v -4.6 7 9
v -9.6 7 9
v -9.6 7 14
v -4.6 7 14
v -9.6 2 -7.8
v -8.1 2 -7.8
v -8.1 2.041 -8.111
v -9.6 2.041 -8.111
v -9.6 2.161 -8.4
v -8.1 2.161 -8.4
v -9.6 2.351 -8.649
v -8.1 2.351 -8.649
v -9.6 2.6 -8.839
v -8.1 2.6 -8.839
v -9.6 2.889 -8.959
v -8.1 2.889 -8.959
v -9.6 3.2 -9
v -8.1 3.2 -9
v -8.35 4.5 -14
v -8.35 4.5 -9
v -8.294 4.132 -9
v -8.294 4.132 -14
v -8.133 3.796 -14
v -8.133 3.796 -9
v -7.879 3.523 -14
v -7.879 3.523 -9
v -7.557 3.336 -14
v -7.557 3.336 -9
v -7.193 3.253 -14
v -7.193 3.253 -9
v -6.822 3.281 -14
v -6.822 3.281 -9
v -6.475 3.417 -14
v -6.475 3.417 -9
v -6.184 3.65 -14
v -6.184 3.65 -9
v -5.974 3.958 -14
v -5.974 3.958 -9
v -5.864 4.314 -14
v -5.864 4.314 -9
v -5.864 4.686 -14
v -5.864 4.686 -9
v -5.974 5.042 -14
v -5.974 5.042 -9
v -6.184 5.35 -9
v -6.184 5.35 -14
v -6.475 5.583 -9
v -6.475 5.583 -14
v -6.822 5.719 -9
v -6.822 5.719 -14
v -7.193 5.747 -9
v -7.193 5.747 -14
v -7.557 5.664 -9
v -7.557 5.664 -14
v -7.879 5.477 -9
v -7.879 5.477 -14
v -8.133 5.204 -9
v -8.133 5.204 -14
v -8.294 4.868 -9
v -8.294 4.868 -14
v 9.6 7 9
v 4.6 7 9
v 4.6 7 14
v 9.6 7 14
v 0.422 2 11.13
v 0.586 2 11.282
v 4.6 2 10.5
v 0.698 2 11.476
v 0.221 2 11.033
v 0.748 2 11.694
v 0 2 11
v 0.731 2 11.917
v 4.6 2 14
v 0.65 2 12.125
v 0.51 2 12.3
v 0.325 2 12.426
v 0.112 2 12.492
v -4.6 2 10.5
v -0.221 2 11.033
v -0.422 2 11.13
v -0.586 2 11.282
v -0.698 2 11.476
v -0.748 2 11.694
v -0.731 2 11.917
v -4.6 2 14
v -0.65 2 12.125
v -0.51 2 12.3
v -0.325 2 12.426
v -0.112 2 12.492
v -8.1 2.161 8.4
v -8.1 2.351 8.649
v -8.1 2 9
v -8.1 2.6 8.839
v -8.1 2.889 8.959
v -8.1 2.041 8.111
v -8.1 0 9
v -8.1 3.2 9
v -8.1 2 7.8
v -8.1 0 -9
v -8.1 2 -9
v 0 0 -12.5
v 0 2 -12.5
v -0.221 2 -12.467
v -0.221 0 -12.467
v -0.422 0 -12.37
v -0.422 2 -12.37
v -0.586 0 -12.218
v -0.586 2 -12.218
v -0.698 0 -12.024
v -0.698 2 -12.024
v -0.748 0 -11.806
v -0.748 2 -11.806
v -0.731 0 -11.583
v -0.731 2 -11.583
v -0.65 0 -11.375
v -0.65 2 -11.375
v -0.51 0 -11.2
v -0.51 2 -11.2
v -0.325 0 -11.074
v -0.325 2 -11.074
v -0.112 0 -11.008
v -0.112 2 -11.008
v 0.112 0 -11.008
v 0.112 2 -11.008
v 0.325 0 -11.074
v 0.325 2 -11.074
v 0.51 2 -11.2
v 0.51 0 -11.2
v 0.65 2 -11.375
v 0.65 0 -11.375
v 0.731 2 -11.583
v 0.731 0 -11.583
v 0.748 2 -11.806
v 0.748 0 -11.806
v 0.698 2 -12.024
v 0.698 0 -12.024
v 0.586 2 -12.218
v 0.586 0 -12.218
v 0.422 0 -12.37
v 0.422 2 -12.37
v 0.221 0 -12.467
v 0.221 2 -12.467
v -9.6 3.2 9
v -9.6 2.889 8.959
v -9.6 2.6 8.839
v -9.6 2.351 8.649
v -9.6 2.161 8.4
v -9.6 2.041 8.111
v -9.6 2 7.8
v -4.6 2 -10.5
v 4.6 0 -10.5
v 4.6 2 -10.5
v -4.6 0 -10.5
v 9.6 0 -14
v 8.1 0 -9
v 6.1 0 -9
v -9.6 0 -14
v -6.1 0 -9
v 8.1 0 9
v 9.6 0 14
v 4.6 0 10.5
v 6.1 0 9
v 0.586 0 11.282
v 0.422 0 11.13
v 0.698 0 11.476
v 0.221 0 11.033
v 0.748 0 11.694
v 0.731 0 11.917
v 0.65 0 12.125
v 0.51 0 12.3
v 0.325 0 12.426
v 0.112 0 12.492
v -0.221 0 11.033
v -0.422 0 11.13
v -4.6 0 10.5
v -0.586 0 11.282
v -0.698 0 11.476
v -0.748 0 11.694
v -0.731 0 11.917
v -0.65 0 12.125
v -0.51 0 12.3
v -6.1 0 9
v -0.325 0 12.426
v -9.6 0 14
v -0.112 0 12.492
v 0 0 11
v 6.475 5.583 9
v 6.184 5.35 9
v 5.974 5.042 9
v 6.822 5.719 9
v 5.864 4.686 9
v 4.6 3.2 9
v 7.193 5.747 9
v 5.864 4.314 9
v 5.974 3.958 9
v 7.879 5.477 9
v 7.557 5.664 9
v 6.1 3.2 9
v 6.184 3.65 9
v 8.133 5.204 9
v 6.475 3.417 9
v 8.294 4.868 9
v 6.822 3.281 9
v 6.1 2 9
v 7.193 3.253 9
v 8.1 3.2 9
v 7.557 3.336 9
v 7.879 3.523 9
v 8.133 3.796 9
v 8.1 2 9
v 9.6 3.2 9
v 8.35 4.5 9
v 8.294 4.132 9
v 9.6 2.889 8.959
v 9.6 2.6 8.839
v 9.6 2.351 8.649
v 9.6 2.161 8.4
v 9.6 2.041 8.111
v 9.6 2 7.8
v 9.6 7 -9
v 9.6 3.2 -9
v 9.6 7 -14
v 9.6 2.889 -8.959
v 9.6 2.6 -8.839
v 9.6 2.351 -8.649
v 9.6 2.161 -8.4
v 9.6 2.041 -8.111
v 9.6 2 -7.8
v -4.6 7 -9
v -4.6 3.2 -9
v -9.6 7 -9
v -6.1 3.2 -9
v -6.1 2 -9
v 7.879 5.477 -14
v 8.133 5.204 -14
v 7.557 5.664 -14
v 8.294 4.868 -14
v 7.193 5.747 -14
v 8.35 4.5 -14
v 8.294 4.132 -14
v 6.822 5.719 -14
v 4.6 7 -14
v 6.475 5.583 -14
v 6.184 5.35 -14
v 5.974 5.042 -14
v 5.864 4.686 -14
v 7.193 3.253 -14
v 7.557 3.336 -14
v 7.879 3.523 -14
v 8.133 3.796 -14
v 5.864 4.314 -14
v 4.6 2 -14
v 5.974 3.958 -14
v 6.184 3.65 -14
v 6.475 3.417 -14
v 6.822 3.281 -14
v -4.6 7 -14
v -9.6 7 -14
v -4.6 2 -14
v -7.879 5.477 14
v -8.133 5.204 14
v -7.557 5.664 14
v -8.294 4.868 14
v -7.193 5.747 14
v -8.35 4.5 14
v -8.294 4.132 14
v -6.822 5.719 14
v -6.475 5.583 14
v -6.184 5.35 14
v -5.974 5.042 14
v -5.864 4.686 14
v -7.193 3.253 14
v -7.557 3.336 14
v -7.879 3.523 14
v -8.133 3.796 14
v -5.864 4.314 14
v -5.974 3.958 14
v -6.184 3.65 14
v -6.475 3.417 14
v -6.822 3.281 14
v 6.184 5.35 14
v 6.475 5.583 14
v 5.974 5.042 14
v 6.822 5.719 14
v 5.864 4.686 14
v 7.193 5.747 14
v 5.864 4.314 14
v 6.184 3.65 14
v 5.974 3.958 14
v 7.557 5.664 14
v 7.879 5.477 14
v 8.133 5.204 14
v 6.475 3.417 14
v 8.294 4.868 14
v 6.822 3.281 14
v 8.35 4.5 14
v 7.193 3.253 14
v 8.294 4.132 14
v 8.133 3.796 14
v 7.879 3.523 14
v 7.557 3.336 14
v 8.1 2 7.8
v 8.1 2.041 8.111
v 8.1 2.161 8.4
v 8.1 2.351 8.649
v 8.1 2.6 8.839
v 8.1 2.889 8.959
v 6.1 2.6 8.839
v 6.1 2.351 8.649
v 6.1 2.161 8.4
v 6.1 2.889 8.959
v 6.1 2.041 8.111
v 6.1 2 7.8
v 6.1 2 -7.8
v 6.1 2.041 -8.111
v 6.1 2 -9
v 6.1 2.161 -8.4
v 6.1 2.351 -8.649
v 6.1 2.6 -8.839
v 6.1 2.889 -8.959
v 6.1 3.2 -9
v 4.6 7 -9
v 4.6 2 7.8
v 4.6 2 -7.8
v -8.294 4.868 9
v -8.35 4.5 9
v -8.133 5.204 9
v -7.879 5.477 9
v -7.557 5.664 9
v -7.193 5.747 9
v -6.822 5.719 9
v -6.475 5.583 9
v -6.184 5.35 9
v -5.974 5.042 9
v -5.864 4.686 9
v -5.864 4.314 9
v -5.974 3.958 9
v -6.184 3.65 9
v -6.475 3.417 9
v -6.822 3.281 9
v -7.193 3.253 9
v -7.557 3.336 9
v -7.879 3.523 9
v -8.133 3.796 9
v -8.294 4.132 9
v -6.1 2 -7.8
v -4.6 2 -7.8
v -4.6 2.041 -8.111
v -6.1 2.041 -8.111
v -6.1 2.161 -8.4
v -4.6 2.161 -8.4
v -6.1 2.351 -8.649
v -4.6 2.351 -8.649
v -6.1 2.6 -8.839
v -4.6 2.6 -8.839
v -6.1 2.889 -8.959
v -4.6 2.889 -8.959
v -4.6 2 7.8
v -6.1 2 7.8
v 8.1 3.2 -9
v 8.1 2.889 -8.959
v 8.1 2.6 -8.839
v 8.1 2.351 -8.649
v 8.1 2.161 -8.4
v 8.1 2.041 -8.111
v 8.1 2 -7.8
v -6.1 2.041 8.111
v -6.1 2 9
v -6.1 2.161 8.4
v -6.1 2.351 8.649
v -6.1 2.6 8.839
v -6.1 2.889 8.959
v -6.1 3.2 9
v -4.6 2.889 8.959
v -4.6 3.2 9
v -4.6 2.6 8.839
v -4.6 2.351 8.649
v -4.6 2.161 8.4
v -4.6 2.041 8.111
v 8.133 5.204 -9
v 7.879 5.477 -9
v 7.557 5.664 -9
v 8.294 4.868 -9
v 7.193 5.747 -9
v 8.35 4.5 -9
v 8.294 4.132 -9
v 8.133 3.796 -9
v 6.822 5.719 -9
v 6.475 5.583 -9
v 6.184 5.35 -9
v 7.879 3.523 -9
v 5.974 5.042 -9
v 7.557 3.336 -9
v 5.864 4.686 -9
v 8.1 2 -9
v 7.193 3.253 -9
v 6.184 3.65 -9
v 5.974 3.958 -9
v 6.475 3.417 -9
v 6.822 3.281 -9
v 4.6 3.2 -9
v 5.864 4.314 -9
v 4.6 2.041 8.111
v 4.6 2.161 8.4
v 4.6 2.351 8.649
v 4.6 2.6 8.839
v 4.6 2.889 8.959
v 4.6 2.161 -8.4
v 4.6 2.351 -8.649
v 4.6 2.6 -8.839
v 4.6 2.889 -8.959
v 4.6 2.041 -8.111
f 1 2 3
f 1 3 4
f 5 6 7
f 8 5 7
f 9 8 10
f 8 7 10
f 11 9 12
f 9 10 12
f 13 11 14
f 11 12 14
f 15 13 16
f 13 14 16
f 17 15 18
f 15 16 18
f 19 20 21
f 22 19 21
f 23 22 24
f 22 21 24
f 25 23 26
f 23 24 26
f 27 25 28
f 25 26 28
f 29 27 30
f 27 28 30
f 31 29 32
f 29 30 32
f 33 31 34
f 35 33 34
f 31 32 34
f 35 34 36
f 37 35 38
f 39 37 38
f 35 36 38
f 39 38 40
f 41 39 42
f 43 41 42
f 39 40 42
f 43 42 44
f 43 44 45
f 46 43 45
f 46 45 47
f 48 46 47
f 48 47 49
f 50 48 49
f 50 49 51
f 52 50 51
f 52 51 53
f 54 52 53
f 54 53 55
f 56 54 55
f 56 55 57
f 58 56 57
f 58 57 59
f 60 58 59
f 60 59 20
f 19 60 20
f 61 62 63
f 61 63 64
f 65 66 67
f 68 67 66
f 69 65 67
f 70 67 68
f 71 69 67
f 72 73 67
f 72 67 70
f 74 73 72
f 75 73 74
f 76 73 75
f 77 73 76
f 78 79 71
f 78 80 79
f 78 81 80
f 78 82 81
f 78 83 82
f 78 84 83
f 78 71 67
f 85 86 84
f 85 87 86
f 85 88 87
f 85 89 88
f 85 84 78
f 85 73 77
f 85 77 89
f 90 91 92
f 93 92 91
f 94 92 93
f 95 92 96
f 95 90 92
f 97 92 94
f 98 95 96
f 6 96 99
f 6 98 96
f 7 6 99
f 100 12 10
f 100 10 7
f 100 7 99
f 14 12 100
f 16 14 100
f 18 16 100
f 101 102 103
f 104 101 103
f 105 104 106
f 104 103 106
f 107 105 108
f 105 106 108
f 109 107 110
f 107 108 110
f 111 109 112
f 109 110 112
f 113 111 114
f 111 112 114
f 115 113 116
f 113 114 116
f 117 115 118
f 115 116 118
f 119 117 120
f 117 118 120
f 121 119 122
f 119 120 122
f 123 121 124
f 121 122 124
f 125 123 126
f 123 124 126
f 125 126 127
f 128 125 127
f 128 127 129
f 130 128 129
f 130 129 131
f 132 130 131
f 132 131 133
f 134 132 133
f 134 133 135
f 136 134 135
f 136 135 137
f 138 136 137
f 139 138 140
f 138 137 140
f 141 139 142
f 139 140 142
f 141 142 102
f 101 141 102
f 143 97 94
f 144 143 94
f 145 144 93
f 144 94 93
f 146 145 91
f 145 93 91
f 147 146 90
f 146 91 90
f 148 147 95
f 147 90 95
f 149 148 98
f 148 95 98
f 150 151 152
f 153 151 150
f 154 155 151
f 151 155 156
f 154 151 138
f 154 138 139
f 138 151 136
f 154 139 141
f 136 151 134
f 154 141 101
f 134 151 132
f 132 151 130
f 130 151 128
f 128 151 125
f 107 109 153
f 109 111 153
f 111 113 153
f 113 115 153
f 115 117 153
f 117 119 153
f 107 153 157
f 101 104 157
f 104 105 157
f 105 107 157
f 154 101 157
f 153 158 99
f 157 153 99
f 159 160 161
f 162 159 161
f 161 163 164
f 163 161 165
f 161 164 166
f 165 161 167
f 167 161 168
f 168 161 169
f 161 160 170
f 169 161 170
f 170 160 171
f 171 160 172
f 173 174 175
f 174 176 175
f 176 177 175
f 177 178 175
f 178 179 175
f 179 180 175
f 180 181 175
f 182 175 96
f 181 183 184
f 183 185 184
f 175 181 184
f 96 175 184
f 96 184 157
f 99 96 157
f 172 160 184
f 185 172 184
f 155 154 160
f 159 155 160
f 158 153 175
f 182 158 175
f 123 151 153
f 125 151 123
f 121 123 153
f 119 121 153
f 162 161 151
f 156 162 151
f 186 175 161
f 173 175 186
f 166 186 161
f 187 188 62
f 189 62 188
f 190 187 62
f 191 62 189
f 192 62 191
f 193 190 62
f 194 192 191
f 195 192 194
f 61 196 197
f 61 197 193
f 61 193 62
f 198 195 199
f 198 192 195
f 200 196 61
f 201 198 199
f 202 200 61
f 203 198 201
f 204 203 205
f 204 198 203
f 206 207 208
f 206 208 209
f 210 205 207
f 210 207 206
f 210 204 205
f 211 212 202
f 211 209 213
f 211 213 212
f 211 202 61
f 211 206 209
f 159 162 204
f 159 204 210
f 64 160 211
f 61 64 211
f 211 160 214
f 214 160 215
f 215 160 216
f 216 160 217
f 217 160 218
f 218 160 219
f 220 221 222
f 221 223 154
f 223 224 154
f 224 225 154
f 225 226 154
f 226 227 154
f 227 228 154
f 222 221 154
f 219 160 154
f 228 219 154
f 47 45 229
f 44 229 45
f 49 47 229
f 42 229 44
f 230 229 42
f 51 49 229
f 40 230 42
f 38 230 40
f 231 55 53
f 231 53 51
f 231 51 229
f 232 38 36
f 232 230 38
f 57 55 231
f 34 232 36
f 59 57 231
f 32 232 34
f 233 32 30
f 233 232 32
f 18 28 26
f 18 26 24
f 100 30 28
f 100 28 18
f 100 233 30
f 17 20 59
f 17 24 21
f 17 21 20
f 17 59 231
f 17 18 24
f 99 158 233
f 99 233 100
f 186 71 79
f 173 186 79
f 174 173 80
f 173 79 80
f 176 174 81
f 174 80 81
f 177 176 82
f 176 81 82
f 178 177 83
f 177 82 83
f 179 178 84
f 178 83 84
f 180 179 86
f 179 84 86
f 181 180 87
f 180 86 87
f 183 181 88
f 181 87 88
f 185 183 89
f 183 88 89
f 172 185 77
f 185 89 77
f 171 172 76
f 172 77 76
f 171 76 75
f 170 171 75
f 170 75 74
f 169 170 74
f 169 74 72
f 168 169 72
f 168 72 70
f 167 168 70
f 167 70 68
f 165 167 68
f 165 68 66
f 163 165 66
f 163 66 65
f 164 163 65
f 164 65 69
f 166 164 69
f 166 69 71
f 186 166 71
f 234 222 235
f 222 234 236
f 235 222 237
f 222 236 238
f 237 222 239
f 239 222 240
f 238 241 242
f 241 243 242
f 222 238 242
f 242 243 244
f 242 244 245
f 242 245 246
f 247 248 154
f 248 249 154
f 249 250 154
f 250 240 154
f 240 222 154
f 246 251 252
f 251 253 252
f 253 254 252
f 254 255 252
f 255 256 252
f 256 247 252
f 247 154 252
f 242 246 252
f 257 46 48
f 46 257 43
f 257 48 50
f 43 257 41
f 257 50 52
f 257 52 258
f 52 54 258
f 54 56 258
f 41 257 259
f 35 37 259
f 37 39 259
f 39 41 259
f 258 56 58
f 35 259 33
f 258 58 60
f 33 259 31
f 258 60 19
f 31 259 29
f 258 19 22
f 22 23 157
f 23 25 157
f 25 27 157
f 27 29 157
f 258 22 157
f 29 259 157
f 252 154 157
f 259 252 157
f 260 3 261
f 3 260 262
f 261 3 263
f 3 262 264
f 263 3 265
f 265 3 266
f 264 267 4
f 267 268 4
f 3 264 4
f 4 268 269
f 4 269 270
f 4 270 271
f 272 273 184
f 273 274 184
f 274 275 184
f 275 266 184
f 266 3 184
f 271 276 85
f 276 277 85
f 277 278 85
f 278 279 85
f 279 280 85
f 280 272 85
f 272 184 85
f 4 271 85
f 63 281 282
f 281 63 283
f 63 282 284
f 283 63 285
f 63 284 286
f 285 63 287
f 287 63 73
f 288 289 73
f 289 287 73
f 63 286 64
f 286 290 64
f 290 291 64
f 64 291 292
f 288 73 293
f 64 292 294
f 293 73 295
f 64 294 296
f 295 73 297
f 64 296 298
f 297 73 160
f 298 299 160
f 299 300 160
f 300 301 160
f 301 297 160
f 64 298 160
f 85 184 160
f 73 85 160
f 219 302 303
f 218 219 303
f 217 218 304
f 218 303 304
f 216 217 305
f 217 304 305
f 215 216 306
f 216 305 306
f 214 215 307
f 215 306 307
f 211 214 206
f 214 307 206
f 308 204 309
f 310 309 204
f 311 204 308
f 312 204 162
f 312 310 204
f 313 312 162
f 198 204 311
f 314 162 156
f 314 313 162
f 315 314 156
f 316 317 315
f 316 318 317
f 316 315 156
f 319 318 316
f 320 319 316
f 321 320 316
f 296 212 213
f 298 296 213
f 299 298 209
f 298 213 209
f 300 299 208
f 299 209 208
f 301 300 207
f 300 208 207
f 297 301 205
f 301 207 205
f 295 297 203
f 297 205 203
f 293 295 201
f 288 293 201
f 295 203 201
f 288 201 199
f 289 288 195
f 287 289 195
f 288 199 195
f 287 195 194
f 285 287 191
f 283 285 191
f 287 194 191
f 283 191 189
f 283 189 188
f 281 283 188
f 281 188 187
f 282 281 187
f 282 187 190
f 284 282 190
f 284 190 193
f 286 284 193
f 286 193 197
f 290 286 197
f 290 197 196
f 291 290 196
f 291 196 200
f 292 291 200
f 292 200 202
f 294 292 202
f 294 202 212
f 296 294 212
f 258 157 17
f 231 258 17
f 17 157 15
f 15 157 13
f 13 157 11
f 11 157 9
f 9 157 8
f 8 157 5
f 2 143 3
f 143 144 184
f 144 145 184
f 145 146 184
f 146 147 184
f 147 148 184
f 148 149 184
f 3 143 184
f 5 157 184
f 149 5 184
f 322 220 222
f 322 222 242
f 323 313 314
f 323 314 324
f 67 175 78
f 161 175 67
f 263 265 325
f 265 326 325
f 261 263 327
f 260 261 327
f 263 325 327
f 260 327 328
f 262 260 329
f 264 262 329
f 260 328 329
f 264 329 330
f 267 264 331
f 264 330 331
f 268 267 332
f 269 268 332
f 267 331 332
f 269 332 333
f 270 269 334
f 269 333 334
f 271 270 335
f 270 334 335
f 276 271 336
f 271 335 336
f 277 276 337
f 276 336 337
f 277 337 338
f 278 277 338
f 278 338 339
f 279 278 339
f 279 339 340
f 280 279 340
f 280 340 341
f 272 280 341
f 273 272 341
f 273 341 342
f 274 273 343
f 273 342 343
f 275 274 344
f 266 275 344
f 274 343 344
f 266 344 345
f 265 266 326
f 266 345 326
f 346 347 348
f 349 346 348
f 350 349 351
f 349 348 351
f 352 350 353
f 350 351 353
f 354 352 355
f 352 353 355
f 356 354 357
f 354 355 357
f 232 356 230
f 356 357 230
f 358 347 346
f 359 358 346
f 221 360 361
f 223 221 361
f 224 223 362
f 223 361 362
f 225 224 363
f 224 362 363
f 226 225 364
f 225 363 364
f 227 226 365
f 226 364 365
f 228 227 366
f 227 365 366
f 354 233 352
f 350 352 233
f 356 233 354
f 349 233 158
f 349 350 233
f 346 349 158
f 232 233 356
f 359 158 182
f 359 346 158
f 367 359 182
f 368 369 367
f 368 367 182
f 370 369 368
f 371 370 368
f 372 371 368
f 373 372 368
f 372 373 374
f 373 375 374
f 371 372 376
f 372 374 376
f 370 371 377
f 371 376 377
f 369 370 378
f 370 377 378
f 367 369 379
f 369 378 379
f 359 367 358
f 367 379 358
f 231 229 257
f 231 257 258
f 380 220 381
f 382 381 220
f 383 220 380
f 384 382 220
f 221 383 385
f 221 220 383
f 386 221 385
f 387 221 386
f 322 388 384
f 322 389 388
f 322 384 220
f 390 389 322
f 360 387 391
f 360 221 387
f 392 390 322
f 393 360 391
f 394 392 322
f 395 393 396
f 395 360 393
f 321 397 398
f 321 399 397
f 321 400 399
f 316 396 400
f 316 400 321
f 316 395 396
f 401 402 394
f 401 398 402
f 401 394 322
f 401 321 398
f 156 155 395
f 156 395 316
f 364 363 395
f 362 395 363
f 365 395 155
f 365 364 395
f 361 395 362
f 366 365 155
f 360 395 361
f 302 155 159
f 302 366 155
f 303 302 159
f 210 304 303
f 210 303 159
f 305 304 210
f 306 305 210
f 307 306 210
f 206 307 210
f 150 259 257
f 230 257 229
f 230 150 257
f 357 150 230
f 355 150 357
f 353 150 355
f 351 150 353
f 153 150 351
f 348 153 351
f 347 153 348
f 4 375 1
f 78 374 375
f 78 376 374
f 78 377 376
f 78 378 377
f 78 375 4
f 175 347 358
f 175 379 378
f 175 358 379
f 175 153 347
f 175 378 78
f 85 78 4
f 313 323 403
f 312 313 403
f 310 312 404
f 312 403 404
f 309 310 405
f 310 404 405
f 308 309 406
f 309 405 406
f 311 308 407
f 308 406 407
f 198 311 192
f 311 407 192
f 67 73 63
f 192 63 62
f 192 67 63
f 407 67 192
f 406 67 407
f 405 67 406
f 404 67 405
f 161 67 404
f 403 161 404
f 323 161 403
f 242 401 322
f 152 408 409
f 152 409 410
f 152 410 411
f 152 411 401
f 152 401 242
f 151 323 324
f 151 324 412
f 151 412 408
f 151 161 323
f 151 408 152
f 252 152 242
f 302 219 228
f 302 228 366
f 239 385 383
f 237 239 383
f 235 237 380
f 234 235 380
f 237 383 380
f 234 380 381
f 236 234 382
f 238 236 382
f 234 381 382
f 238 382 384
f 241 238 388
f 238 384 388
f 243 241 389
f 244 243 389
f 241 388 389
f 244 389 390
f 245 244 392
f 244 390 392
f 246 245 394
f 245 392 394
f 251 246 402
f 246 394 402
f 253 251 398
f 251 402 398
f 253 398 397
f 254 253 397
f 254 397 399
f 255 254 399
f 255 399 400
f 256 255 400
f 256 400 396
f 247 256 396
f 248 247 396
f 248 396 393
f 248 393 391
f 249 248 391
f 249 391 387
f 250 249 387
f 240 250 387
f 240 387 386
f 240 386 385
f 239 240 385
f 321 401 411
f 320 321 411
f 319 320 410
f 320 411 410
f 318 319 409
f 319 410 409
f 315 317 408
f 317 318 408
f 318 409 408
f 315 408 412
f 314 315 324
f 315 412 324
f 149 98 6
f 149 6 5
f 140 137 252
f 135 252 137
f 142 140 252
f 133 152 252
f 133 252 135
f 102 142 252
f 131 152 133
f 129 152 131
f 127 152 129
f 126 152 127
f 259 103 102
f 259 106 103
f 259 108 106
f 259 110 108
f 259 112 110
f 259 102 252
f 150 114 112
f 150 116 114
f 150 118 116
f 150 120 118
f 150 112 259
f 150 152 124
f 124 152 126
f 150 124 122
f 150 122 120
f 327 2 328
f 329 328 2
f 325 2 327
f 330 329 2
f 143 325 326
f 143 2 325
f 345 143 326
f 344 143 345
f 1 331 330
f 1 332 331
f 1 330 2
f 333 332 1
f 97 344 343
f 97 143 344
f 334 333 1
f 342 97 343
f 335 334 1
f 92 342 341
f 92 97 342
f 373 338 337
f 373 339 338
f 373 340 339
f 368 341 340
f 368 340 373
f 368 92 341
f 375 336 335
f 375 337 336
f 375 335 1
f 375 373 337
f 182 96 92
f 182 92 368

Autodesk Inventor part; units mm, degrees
ref_plane "YZ Plane" through (0, 0, 0) normal (1, 0, 0) x (0, 1, 0)
sketch "スケッチ1" plane through (0, 0, 0) normal (0, 1, 0) x (-1, 0, 0)
  line L0 (4.6, 10.5) -> (-4.6, 10.5)
  line L1 (-4.6, 10.5) -> (-4.6, -10.5)
  line L2 (-4.6, -10.5) -> (4.6, -10.5)
  line L3 (4.6, -10.5) -> (4.6, 10.5)
  line L4 (4.6, -10.5) -> (-4.6, 10.5) construction
  line L5 (4.6, 10.5) -> (-4.6, -10.5) construction
  line L6 (9.6, 10.5) -> (9.6, -10.5)
  line L7 (-9.6, 10.5) -> (-9.6, -10.5)
  line L8 (0, 4) -> (0, -4) construction
  line L9 (0, 11.75) -> (0, -11.75) construction
  line L10 (9.6, -10.5) -> (9.6, -14)
  line L11 (9.6, -14) -> (-9.6, -14)
  line L12 (-9.6, -14) -> (-9.6, -10.5)
  line L13 (-9.6, 10.5) -> (-9.6, 14)
  line L14 (-9.6, 14) -> (9.6, 14)
  line L15 (9.6, 14) -> (9.6, 10.5)
  point P0 (0, 0)
  point P1 (0, 0)
  point P2 (0, 0)
  dimension "d0" = 21
  dimension "d1" = 9.2
  dimension "d2" = 5
  dimension "d3" = 23.5
  dimension "d4" = 8
  dimension "d21" = 3.5
  dimension "d26" = 5
  dimension "d27" = 3.5
extrude "押し出し1" add sketch "スケッチ1" along normal blind 2
hole "穴1" at (0, 0, 4) at (0, 0, -4) at (0, 0, 11.75) at (0, 0, -11.75) direction (0, 1, 0) diameter 1.5 end through all
sketch "スケッチ2" plane through (0, 2, 0) normal (0, 1, 0) x (1, 0, 0)
  line L0 (-4.6, -10.5) -> (-4.6, 10.5) projected
  circle A0 centre (0, -11.75) radius 0.75 projected
  circle A1 centre (0, 11.75) radius 0.75 projected
  line L1 (-9.6, 14) -> (-9.6, -14) projected
  line L2 (9.6, -14) -> (9.6, 14) projected
  line L3 (9.6, 14) -> (-9.6, 14) projected
  line L4 (-9.6, -14) -> (9.6, -14) projected
  line L5 (-9.6, 14) -> (-9.6, -14) projected
  line L6 (-9.6, -14) -> (9.6, -14) projected
  line L7 (-4.6, -14) -> (-9.6, -14)
  line L8 (-9.6, -14) -> (-9.6, -9)
  line L9 (-9.6, -9) -> (-4.6, -9)
  line L10 (-4.6, -9) -> (-4.6, -14)
  point P0 (0, 0)
  dimension "d28" = 5
extrude "押し出し2" add sketch "スケッチ2" along normal blind 5 contours L10 L4 L1 L9 L0
sketch "スケッチ6" plane through (-4.6, 2, 9) normal (0, 0, -1) x (-1, 0, 0)
  line L0 (5, 0) -> (0, 5) construction
  line L1 (5, 5) -> (0, 0) construction
  circle A0 centre (2.5, 2.5) radius 1.25
  point P0 (-4.6, -2)
  dimension "d29" = 2.5
extrude "押し出し5" cut sketch "スケッチ6" along normal through all both and the other way through all
mirror "ミラー4" about plane through (0, 0, 0) normal (0, 0, 1) of "押し出し2", "押し出し5"
sketch "スケッチ7" plane through (0, 2, 0) normal (0, 1, 0) x (1, 0, 0)
  line L0 (-4.6, 9) -> (-9.6, 9) projected
  line L1 (-9.6, -9) -> (-4.6, -9) projected
  line L2 (-4.6, -9) -> (-9.6, 9) construction
  line L3 (-4.6, 9) -> (-9.6, -9) construction
  line L4 (-6.1, -9) -> (-8.1, -9)
  line L5 (-8.1, -9) -> (-8.1, 9)
  line L6 (-8.1, 9) -> (-6.1, 9)
  line L7 (-6.1, 9) -> (-6.1, -9)
  line L8 (-6.1, -9) -> (-8.1, 9) construction
  point P0 (0, 0)
  point P1 (-7.1, 0)
  point P2 (-8.1, -9)
  dimension "d32" = 2
extrude "押し出し6" cut sketch "スケッチ7" against normal through all
mirror "ミラー5" about plane through (0, 0, 0) normal (1, 0, 0) of "押し出し2", "押し出し5", "ミラー4", "押し出し6"
fillet "フィレット1" radius 1.2 8 edges at (-8.85, 2, -9) (-5.35, 2, -9) (5.35, 2, -9) (8.85, 2, -9) (-8.85, 2, 9) (-5.35, 2, 9) (5.35, 2, 9) (8.85, 2, 9)
ref_plane "作業平面1" through (7.1, 0, 14) normal (1, 0, 0) x (0, 0, -1)
ref_plane "作業平面2" through (-7.1, 0, 10.5) normal (1, 0, 0) x (0, 0, -1)
equation "\"d26\" = d2"
equation "\"d27\" = d21"
properties part number "om_DropBase" material "ABS プラスチック"
